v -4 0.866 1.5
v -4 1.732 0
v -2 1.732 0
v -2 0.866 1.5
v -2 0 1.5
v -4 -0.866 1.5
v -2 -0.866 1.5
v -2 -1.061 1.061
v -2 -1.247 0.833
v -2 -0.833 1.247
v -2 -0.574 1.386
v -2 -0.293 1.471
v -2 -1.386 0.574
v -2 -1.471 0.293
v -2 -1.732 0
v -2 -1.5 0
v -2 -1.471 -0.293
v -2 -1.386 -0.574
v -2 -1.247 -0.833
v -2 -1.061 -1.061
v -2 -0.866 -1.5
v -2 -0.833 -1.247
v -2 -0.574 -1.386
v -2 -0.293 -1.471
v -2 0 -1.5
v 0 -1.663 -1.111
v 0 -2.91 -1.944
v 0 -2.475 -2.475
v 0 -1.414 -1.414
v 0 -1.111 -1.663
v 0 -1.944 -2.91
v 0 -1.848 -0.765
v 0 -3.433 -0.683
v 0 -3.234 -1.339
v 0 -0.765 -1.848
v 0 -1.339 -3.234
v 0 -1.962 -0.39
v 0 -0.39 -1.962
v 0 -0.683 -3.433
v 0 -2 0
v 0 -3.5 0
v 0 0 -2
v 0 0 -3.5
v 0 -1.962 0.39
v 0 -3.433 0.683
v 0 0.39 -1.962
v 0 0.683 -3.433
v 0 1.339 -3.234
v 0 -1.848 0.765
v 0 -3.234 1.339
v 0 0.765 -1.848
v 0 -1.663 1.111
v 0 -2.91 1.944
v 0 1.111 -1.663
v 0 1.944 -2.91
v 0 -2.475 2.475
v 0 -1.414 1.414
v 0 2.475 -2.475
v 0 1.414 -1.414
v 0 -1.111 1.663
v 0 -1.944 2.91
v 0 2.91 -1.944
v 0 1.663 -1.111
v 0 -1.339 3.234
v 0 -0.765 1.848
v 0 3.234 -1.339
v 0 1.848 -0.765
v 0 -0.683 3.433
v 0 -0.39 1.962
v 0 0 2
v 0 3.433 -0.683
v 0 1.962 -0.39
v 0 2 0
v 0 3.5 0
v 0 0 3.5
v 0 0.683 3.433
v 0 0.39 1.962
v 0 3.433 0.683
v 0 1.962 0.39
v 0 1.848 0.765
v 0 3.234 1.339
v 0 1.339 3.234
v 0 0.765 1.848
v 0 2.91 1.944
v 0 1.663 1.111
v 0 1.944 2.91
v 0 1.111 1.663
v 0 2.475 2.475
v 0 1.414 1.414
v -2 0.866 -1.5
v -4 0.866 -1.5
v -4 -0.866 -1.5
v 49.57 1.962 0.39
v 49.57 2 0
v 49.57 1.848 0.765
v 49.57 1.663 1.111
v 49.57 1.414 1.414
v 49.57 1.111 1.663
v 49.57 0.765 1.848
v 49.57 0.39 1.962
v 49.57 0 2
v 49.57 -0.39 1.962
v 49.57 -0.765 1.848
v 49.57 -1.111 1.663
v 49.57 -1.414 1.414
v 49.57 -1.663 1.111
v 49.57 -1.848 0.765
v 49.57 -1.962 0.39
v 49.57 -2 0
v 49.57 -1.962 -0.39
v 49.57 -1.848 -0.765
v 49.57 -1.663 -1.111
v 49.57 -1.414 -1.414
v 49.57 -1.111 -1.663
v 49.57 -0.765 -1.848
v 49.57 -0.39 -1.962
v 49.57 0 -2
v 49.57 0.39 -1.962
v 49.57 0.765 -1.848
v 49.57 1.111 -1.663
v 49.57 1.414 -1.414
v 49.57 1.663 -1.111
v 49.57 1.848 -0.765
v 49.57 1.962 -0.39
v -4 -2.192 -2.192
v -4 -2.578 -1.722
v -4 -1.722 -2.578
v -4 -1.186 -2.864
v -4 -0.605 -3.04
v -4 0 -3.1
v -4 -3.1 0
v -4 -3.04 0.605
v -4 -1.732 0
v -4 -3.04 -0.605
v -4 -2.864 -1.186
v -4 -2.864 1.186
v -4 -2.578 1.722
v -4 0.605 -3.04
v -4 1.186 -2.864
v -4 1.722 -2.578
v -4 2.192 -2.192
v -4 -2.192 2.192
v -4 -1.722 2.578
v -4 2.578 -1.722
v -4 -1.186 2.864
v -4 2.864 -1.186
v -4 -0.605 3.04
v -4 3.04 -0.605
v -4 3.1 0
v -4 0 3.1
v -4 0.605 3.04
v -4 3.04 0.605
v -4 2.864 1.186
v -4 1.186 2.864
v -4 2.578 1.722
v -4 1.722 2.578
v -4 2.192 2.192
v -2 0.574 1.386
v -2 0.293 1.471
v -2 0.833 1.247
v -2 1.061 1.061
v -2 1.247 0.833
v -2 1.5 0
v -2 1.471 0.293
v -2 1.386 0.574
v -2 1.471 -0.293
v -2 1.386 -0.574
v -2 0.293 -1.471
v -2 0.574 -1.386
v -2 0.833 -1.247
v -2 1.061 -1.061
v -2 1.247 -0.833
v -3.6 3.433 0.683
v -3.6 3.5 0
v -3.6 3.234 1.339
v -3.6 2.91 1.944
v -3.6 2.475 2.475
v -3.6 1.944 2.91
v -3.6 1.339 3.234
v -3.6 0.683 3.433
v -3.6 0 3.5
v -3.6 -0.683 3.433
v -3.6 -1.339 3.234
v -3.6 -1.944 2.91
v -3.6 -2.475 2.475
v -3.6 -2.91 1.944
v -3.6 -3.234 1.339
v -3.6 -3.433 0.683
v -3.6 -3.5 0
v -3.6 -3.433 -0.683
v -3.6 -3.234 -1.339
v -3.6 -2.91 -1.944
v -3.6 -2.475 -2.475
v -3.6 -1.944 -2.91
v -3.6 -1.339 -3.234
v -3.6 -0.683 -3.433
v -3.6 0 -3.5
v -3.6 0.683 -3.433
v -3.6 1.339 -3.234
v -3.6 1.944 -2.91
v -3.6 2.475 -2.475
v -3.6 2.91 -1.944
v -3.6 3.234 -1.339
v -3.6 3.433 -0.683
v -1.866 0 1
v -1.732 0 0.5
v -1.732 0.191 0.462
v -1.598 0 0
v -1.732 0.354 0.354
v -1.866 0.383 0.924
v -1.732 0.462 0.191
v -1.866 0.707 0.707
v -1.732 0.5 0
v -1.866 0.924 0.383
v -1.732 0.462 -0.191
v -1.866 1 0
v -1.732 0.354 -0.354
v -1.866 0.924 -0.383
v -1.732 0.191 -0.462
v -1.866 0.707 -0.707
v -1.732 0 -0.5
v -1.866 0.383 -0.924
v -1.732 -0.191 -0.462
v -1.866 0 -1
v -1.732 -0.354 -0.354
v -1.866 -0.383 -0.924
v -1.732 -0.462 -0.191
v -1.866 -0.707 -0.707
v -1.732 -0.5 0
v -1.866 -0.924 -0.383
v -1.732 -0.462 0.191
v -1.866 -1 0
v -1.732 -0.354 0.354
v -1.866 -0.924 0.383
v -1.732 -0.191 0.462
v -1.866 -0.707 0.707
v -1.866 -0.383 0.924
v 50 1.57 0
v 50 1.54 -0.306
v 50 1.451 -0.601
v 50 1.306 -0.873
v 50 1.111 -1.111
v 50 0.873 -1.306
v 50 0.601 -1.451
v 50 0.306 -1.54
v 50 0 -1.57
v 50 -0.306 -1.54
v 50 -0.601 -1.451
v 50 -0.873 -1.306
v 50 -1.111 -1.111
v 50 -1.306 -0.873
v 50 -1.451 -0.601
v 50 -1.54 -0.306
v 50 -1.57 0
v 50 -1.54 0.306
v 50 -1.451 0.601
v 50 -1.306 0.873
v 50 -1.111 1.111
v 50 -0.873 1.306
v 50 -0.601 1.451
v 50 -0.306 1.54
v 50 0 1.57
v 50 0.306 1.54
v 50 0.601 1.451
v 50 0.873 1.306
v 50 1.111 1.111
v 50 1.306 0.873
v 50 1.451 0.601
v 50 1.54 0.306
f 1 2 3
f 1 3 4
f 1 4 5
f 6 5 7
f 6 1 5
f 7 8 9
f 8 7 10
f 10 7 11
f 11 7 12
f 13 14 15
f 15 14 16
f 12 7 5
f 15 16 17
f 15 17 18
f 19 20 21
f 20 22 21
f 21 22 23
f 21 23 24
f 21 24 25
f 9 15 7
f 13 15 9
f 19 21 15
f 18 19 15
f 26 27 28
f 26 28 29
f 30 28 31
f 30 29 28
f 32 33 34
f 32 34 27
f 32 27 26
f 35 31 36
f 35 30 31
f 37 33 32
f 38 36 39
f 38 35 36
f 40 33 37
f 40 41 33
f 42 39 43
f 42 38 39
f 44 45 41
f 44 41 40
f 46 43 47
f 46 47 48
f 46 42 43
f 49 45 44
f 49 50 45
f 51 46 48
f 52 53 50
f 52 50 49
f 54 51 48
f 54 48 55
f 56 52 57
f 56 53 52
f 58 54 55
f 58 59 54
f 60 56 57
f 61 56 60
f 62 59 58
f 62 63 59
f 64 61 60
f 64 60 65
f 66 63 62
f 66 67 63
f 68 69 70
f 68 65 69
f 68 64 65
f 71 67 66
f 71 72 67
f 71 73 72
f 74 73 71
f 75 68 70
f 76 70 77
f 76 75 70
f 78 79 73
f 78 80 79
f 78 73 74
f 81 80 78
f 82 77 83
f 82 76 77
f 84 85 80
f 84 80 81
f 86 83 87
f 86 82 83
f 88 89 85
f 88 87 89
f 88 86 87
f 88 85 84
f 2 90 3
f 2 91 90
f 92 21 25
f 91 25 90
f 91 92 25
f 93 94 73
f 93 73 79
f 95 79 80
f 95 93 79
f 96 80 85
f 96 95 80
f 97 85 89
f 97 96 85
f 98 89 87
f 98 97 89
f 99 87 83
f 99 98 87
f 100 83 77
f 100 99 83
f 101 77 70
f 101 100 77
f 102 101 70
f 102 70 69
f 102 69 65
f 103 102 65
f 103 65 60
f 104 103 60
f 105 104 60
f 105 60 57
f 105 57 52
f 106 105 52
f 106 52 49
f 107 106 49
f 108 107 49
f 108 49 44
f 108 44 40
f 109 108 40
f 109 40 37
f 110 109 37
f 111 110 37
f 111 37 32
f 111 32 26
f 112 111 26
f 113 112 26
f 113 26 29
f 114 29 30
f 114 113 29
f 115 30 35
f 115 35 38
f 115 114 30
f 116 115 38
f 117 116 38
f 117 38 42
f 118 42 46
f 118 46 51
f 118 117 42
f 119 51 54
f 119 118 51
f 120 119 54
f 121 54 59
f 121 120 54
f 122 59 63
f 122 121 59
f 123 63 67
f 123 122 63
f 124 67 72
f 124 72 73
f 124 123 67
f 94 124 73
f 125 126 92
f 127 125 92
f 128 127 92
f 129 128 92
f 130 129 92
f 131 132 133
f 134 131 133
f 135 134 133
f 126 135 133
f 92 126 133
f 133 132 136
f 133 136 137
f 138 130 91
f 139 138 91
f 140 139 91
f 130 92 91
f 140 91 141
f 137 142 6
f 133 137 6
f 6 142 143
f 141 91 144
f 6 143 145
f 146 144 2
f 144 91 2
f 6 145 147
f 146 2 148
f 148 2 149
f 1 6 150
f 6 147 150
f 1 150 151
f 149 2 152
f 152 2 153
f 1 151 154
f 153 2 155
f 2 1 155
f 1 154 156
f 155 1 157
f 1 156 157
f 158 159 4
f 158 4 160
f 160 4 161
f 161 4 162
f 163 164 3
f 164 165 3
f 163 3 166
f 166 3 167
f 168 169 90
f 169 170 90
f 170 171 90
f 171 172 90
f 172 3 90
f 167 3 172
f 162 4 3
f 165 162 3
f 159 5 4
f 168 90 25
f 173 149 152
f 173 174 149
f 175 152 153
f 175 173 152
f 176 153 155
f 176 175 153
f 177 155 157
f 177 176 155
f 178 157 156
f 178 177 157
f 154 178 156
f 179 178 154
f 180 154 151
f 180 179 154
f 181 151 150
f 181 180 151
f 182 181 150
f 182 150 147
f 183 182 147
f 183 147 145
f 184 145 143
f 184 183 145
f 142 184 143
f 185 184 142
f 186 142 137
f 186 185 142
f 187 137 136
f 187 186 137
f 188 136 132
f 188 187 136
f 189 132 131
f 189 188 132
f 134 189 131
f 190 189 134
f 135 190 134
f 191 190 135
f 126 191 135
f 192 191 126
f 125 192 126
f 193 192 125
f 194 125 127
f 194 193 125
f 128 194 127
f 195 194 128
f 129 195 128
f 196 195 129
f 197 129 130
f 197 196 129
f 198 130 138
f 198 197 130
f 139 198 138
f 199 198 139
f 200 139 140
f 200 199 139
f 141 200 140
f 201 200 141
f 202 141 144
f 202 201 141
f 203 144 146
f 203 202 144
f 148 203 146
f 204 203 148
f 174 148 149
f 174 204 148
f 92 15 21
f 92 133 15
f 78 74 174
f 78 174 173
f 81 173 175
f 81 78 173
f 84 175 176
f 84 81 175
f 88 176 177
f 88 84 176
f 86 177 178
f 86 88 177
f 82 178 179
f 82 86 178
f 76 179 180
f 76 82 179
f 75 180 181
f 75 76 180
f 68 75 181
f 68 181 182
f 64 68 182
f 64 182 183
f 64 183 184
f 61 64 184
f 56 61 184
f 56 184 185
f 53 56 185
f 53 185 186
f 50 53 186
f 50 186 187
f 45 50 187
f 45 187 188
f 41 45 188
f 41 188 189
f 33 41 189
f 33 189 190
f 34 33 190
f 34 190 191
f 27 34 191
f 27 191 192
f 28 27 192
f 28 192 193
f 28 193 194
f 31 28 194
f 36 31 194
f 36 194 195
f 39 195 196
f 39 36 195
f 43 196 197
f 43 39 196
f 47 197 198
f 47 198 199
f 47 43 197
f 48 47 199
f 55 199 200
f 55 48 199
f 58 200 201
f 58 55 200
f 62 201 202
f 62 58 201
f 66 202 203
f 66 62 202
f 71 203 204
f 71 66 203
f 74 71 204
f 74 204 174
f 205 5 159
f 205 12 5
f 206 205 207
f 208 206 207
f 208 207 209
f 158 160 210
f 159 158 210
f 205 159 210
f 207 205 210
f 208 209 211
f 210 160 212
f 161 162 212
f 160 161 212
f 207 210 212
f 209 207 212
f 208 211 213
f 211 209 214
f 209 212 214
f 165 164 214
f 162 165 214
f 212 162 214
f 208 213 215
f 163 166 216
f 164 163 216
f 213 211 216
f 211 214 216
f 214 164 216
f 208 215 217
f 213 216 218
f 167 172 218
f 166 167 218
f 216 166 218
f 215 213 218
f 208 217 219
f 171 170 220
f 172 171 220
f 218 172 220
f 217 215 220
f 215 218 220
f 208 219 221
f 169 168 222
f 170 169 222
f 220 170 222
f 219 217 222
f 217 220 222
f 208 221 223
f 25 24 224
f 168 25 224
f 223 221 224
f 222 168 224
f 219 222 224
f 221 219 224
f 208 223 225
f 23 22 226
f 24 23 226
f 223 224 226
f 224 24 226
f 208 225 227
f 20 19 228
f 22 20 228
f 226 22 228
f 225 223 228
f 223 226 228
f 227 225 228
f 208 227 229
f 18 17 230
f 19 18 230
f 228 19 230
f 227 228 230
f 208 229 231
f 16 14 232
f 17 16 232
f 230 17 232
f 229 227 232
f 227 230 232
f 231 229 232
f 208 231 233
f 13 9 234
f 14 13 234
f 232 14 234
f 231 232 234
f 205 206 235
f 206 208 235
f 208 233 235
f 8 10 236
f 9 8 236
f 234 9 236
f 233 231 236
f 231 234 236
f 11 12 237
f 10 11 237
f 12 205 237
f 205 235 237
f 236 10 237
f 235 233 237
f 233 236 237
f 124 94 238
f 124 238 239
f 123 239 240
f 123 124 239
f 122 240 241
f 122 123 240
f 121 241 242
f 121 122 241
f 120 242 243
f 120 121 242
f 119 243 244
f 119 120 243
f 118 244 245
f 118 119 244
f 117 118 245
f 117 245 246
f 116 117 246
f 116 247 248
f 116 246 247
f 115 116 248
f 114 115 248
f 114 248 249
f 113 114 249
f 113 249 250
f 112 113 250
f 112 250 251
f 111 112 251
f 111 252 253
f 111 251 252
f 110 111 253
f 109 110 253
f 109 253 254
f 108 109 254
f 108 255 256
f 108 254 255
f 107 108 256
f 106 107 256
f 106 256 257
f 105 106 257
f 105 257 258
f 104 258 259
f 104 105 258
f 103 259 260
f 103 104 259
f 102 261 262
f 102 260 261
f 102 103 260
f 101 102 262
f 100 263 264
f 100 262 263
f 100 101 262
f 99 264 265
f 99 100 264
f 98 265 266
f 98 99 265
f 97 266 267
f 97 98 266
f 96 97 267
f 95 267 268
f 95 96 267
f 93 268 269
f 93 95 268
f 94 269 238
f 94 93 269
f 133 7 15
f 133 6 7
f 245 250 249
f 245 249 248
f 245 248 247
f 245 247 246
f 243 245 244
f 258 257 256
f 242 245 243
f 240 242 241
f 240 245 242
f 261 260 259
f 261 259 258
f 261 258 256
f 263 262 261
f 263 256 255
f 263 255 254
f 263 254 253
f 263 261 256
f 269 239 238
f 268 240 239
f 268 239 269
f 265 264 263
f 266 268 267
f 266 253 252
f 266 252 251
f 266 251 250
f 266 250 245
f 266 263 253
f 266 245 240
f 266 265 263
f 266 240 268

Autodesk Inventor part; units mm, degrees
sketch "Sketch_2" plane through (0, 0, 0) normal (0, 0, 1) x (1, 0, 0)
  line L0 (50, 0) -> (-4, 0)
  line L1 (-4, 0) -> (-4, 3.1)
  line L2 (-4, 3.1) -> (-3.6, 3.5)
  line L3 (-3.6, 3.5) -> (0, 3.5)
  line L4 (0, 3.5) -> (0, 2)
  line L5 (0, 2) -> (49.5705, 2)
  line L6 (49.5705, 2) -> (50, 1.5705)
  line L7 (50, 1.5705) -> (50, 0)
  line L8 (50, 0) -> (-4, 0)
revolve "Revolution1" add sketch "Sketch_2" angle 360 about axis through (50, 0, 0) along (1, 0, 0)
thread "Thread1" size "M4x0.7" class "6g" standard "ISO Metric profile" length 19.5705
sketch "Sketch2" plane through (-4, 0, 0) normal (-1, 0, 0) x (0, 0, 1)
  point P0 (0, 0)
hole "Hole1" at (-4, 0, 0) direction (1, 0, 0) diameter 3 depth 2 tip angle 150
sketch "Sketch_3" plane through (-4, 0, 0) normal (1, 0, 0) x (0, 0, -1)
  line L0 (-1.5, -0.866) -> (0, -1.7321)
  line L1 (0, -1.7321) -> (1.5, -0.866)
  line L2 (1.5, -0.866) -> (1.5, 0.866)
  line L3 (1.5, 0.866) -> (0, 1.7321)
  line L4 (0, 1.7321) -> (-1.5, 0.866)
  line L5 (-1.5, 0.866) -> (-1.5, -0.866)
extrude "Extrusion1" cut sketch "Sketch_3" along normal blind 2
ref_plane "bolt_to_nut_XY" through (50, 0, 0) normal (1, 0, 0) x (0, 0, -1)
ref_plane "bolt_to_nut_YZ" through (50, 0, 0) normal (0, 0, -1) x (0, 1, 0)
ref_plane "bolt_to_nut_ZX" through (50, 0, 0) normal (0, 1, 0) x (1, 0, 0)
ref_plane "screw1_XY" through (0, 0, 0) normal (1, 0, 0) x (0, 0, -1)
ref_plane "screw1_YZ" through (0, 0, 0) normal (0, 0, -1) x (0, 1, 0)
ref_plane "screw1_ZX" through (0, 0, 0) normal (0, 1, 0) x (1, 0, 0)
properties part number "CB4-50" material "鋼、炭素鋼"
